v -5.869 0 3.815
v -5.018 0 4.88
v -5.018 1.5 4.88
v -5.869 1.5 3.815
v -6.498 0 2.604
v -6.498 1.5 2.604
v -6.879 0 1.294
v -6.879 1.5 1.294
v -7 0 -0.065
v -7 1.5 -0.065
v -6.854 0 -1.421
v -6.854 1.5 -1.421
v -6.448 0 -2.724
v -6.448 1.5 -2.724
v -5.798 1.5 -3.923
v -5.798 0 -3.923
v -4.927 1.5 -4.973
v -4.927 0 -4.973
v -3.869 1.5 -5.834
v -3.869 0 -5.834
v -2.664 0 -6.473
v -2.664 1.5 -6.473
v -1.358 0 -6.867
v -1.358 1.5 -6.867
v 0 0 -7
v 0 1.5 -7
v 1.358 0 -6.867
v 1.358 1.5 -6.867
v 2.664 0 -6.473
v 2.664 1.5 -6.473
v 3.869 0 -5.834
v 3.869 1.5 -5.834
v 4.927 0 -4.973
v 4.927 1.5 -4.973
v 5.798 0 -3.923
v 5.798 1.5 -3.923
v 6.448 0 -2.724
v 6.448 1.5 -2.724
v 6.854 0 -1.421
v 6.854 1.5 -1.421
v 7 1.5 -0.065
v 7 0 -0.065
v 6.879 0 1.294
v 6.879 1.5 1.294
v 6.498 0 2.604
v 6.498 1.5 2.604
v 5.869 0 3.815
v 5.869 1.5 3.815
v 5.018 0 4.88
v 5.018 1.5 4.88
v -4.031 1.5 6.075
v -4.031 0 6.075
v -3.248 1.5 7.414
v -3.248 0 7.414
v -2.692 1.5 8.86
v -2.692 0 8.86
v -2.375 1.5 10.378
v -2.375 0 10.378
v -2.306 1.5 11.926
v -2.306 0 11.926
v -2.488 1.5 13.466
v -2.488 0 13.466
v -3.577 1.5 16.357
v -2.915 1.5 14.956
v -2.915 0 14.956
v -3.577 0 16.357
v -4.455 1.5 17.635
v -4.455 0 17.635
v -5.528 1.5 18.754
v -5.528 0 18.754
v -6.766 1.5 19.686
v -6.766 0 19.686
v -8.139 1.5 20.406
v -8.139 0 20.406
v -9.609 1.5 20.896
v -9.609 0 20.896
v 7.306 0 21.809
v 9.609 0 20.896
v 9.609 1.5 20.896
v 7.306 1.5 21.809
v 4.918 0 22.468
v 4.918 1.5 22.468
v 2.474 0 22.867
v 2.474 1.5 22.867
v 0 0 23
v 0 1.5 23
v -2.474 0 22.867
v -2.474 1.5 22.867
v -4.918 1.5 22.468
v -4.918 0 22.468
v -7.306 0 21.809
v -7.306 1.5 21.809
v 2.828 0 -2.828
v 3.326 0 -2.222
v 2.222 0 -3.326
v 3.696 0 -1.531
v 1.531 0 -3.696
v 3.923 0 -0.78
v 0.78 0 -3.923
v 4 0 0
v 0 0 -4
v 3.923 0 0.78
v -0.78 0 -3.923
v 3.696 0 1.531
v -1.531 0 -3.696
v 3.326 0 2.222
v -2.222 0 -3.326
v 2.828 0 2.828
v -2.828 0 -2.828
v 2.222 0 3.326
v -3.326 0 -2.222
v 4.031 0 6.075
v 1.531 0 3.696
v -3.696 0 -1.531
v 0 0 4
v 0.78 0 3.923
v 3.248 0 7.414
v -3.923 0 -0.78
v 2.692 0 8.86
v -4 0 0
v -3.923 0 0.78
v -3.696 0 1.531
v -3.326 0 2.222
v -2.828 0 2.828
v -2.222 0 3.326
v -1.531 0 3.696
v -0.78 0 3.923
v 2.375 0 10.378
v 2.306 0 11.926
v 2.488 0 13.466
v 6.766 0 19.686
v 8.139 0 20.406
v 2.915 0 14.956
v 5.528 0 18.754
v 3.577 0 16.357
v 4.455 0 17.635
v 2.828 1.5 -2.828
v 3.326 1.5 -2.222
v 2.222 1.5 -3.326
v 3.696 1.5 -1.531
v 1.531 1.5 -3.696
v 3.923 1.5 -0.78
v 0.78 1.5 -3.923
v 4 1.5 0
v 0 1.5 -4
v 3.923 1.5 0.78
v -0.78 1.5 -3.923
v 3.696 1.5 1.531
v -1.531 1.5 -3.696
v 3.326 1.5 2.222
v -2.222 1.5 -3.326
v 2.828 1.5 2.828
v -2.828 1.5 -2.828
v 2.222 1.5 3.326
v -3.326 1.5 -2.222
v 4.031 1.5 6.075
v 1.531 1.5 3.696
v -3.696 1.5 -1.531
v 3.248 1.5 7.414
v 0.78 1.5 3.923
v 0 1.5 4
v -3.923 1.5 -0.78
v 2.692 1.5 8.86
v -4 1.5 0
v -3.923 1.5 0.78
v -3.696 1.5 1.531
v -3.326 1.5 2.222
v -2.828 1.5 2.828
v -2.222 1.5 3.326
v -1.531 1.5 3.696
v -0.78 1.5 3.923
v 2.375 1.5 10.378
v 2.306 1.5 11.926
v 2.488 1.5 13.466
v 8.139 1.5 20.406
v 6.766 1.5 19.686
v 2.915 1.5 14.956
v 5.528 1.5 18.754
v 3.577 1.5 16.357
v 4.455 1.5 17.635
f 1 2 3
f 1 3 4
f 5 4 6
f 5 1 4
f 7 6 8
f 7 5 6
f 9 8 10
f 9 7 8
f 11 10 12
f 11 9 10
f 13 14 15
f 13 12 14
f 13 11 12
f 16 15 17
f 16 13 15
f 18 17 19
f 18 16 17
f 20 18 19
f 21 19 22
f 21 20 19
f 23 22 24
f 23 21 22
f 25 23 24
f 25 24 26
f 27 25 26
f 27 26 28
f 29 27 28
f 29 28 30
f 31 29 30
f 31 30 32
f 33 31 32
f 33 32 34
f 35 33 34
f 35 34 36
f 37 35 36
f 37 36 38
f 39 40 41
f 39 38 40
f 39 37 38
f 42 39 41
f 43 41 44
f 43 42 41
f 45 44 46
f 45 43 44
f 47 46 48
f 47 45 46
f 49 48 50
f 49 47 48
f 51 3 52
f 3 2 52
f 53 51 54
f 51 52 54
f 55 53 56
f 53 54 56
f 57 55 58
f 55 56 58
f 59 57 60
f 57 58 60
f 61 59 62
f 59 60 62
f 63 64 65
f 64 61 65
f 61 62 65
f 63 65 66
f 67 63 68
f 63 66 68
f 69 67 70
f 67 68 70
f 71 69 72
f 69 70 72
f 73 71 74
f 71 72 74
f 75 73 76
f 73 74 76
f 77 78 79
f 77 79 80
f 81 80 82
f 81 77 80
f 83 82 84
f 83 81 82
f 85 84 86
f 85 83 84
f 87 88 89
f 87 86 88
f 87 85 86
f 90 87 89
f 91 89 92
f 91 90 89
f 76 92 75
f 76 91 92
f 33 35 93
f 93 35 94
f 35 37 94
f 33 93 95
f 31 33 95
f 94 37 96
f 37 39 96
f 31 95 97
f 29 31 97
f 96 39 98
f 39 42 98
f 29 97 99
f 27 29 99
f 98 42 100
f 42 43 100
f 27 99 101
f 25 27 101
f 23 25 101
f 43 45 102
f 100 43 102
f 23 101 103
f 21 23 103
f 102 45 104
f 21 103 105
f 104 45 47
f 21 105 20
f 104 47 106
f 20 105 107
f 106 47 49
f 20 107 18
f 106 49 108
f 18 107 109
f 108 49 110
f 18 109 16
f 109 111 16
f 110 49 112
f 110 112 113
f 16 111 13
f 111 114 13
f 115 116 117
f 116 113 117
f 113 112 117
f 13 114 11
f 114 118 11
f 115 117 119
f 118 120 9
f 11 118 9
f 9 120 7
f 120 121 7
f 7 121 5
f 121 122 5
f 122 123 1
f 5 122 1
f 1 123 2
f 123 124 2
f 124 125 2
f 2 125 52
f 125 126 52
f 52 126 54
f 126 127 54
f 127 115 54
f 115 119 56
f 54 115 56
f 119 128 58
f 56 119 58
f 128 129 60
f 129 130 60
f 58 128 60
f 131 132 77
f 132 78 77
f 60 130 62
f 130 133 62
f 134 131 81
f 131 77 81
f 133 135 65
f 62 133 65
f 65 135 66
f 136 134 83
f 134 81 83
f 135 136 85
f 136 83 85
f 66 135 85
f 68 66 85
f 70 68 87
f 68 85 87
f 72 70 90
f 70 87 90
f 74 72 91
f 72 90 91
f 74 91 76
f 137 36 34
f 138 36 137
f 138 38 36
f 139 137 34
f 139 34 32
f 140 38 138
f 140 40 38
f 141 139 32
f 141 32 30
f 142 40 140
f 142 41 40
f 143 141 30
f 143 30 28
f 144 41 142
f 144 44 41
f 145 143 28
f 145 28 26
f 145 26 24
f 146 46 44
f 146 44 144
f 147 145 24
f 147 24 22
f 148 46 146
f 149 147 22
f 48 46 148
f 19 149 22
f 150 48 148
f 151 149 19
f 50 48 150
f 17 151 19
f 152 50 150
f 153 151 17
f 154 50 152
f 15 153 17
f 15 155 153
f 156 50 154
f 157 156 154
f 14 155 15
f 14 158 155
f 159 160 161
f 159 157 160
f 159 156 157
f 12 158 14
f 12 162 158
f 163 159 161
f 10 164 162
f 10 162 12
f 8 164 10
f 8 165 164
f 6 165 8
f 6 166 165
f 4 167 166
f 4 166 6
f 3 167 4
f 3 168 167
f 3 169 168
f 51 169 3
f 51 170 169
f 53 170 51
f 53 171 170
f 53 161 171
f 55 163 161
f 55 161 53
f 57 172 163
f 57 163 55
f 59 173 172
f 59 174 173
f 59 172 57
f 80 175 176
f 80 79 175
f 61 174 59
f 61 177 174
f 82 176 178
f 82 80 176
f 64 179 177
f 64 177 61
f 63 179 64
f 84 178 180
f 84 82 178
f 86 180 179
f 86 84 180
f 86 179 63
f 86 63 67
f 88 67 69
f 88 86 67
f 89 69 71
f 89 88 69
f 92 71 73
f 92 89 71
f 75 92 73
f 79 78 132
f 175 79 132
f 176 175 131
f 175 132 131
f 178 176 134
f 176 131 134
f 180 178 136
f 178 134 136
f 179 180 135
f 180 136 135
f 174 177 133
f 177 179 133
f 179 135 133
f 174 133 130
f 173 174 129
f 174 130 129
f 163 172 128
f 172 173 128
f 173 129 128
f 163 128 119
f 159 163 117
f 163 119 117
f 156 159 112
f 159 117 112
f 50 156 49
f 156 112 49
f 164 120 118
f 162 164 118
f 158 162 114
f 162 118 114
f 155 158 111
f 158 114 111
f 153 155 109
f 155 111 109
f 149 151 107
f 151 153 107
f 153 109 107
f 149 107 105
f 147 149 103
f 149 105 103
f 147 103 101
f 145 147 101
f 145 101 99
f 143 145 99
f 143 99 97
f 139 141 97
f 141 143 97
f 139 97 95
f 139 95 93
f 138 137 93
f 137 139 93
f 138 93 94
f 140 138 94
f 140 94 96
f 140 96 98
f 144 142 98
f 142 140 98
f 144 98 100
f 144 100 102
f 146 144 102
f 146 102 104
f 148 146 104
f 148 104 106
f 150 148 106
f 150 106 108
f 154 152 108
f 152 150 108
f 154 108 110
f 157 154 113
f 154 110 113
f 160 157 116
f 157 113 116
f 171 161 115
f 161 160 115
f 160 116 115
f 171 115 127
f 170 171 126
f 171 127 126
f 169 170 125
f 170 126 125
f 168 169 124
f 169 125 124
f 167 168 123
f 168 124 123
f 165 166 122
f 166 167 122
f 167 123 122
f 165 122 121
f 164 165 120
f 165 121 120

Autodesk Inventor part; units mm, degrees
ref_plane "YZ Plane" through (0, 0, 0) normal (1, 0, 0) x (0, 1, 0)
ref_plane "XZ Plane" through (0, 0, 0) normal (0, 1, 0) x (-1, 0, 0)
ref_plane "XY Plane" through (0, 0, 0) normal (0, 0, 1) x (1, 0, 0)
sketch "Sketch1" plane through (0, 0, 0) normal (0, 1, 0) x (-1, 0, 0)
  circle A0 centre (0, 0) radius 4
  arc A1 (-5.0181, 4.8805) -> (5.0181, 4.8805) centre (0, 0) ccw
  arc A2 (9.6094, 20.8964) -> (-9.6094, 20.8964) centre (0, 0) ccw
  arc A3 (-5.0181, 4.8805) -> (-9.6094, 20.8964) centre (-11.9, 11.5737) ccw
  arc A4 (9.6094, 20.8964) -> (5.0181, 4.8805) centre (11.9, 11.5737) ccw
  line L0 (5.0181, 4.8805) -> (-5.0181, 4.8805)
  dimension "d0" = 8
  dimension "d1" = 14
  dimension "d2" = 46
  dimension "d15" = 9.6
  dimension "d17" = 4.6
extrude "Extrusion3" add sketch "Sketch1" along normal blind 1.5
properties part number "crusher_claw"
